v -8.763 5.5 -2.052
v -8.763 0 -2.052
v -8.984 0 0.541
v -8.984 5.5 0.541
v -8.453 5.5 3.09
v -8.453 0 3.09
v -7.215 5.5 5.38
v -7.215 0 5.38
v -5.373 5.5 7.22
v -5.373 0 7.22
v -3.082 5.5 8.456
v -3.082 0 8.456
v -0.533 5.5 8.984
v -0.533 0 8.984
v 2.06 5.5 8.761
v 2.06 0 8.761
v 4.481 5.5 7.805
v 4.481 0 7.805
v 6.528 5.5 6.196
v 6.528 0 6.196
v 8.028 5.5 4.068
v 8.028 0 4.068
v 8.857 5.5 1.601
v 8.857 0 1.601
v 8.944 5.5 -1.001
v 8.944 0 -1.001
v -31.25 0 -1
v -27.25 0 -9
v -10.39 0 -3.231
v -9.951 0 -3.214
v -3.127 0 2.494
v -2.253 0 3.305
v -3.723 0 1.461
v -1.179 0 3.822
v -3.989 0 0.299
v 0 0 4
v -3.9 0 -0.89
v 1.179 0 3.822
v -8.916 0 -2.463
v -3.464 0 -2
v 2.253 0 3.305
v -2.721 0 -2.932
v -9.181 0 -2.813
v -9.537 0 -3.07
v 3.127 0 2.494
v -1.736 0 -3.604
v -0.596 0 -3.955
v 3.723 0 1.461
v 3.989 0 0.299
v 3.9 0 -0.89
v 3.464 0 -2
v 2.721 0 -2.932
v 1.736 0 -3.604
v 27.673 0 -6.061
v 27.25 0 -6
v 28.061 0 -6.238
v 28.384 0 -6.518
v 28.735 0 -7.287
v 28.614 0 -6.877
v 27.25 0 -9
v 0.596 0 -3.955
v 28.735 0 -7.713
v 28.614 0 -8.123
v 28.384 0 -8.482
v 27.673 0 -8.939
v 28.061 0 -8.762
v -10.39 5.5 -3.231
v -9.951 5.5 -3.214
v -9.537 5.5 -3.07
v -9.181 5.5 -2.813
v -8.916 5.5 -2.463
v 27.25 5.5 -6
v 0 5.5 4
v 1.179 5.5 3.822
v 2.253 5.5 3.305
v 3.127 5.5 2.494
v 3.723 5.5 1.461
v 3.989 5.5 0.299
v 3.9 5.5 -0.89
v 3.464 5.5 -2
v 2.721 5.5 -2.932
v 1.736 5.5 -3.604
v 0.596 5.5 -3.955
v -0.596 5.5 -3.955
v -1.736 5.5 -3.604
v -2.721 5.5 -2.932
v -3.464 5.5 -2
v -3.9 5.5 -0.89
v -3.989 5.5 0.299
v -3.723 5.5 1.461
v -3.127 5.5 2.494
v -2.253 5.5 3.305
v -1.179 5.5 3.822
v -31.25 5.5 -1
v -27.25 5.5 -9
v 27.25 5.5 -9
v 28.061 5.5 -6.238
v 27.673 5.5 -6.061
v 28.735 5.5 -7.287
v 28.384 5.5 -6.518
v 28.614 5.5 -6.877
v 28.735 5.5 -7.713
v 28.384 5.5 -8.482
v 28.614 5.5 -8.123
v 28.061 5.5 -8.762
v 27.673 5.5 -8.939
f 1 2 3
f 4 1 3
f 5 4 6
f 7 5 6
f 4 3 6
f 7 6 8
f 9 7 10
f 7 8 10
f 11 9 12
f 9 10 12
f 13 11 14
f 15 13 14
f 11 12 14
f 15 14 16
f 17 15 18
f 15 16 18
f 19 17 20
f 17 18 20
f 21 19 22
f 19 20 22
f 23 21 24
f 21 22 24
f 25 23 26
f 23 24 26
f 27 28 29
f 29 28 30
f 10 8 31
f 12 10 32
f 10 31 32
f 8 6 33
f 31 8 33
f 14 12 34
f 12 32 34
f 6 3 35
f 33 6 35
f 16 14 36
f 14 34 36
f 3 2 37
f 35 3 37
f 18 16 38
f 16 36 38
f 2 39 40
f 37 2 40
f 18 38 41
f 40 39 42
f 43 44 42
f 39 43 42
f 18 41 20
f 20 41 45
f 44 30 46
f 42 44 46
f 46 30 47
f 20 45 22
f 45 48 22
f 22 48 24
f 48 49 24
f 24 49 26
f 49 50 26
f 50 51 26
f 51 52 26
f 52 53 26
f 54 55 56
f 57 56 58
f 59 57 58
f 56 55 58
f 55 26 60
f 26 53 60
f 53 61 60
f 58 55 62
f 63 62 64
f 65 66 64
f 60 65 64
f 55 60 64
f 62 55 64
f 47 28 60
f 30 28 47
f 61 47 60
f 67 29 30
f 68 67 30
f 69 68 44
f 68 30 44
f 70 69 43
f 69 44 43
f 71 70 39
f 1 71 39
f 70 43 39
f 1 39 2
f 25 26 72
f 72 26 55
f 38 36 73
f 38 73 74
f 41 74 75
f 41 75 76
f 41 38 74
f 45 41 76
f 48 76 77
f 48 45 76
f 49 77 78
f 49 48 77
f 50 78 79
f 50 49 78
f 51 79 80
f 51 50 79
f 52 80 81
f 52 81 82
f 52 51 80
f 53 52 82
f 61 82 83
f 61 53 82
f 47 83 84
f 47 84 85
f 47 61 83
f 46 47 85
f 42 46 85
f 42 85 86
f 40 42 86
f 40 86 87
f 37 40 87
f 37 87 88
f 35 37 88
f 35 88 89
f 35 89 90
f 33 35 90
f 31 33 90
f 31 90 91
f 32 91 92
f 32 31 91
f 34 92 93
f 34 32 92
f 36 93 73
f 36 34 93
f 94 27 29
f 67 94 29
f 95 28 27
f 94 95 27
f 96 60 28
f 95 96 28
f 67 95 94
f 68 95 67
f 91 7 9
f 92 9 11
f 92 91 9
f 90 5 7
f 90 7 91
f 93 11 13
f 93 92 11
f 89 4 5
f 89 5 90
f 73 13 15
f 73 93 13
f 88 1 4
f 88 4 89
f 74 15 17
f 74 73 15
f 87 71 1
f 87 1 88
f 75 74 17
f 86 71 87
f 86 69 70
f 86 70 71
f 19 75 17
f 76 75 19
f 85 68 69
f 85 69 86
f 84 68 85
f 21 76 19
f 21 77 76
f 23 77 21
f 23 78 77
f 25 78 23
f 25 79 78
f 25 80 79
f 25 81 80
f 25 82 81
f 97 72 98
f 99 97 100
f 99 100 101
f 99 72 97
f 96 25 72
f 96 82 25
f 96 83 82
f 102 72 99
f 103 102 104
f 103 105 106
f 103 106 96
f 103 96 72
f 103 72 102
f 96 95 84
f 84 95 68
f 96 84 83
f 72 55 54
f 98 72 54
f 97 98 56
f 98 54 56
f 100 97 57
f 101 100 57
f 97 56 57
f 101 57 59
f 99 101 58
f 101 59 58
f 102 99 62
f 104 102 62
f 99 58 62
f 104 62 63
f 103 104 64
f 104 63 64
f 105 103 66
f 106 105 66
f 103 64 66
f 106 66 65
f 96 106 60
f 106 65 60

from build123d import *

# Parameters (mm, degrees)
SCHIZZO1_R                   = 4
ESTRUSIONE_ESTRUSIONE1_DEPTH = 5.5


with BuildPart() as part:
    # Schizzo1 → Estrusione-Estrusione1 (new body)
    with BuildSketch(Plane(origin=(0, 0, 0), x_dir=(1, 0, 0), z_dir=(0, 1, 0))):
        with BuildLine():
            Line((-31.25, 1), (-10.389548196, 3.231490655))
            ThreePointArc((-10.389548196, 3.231490655), (-9.349630999, 2.954475369), (-8.762875038, 2.0523209))
            ThreePointArc((-8.762875038, 2.0523209), (-0.533351916, -8.98418253), (8.944145279, 1.001131971))
            Line((8.944145279, 1.001131971), (27.25, 6))
            ThreePointArc((27.25, 6), (28.75, 7.5), (27.25, 9))
            Line((27.25, 9), (-27.25, 9))
            Line((-27.25, 9), (-31.25, 1))
        make_face()
        with Locations(Location((0, 0, 0), (0, 0, 270))):
            Circle(SCHIZZO1_R, mode=Mode.SUBTRACT)
    extrude(amount=ESTRUSIONE_ESTRUSIONE1_DEPTH)


solid = part.part
